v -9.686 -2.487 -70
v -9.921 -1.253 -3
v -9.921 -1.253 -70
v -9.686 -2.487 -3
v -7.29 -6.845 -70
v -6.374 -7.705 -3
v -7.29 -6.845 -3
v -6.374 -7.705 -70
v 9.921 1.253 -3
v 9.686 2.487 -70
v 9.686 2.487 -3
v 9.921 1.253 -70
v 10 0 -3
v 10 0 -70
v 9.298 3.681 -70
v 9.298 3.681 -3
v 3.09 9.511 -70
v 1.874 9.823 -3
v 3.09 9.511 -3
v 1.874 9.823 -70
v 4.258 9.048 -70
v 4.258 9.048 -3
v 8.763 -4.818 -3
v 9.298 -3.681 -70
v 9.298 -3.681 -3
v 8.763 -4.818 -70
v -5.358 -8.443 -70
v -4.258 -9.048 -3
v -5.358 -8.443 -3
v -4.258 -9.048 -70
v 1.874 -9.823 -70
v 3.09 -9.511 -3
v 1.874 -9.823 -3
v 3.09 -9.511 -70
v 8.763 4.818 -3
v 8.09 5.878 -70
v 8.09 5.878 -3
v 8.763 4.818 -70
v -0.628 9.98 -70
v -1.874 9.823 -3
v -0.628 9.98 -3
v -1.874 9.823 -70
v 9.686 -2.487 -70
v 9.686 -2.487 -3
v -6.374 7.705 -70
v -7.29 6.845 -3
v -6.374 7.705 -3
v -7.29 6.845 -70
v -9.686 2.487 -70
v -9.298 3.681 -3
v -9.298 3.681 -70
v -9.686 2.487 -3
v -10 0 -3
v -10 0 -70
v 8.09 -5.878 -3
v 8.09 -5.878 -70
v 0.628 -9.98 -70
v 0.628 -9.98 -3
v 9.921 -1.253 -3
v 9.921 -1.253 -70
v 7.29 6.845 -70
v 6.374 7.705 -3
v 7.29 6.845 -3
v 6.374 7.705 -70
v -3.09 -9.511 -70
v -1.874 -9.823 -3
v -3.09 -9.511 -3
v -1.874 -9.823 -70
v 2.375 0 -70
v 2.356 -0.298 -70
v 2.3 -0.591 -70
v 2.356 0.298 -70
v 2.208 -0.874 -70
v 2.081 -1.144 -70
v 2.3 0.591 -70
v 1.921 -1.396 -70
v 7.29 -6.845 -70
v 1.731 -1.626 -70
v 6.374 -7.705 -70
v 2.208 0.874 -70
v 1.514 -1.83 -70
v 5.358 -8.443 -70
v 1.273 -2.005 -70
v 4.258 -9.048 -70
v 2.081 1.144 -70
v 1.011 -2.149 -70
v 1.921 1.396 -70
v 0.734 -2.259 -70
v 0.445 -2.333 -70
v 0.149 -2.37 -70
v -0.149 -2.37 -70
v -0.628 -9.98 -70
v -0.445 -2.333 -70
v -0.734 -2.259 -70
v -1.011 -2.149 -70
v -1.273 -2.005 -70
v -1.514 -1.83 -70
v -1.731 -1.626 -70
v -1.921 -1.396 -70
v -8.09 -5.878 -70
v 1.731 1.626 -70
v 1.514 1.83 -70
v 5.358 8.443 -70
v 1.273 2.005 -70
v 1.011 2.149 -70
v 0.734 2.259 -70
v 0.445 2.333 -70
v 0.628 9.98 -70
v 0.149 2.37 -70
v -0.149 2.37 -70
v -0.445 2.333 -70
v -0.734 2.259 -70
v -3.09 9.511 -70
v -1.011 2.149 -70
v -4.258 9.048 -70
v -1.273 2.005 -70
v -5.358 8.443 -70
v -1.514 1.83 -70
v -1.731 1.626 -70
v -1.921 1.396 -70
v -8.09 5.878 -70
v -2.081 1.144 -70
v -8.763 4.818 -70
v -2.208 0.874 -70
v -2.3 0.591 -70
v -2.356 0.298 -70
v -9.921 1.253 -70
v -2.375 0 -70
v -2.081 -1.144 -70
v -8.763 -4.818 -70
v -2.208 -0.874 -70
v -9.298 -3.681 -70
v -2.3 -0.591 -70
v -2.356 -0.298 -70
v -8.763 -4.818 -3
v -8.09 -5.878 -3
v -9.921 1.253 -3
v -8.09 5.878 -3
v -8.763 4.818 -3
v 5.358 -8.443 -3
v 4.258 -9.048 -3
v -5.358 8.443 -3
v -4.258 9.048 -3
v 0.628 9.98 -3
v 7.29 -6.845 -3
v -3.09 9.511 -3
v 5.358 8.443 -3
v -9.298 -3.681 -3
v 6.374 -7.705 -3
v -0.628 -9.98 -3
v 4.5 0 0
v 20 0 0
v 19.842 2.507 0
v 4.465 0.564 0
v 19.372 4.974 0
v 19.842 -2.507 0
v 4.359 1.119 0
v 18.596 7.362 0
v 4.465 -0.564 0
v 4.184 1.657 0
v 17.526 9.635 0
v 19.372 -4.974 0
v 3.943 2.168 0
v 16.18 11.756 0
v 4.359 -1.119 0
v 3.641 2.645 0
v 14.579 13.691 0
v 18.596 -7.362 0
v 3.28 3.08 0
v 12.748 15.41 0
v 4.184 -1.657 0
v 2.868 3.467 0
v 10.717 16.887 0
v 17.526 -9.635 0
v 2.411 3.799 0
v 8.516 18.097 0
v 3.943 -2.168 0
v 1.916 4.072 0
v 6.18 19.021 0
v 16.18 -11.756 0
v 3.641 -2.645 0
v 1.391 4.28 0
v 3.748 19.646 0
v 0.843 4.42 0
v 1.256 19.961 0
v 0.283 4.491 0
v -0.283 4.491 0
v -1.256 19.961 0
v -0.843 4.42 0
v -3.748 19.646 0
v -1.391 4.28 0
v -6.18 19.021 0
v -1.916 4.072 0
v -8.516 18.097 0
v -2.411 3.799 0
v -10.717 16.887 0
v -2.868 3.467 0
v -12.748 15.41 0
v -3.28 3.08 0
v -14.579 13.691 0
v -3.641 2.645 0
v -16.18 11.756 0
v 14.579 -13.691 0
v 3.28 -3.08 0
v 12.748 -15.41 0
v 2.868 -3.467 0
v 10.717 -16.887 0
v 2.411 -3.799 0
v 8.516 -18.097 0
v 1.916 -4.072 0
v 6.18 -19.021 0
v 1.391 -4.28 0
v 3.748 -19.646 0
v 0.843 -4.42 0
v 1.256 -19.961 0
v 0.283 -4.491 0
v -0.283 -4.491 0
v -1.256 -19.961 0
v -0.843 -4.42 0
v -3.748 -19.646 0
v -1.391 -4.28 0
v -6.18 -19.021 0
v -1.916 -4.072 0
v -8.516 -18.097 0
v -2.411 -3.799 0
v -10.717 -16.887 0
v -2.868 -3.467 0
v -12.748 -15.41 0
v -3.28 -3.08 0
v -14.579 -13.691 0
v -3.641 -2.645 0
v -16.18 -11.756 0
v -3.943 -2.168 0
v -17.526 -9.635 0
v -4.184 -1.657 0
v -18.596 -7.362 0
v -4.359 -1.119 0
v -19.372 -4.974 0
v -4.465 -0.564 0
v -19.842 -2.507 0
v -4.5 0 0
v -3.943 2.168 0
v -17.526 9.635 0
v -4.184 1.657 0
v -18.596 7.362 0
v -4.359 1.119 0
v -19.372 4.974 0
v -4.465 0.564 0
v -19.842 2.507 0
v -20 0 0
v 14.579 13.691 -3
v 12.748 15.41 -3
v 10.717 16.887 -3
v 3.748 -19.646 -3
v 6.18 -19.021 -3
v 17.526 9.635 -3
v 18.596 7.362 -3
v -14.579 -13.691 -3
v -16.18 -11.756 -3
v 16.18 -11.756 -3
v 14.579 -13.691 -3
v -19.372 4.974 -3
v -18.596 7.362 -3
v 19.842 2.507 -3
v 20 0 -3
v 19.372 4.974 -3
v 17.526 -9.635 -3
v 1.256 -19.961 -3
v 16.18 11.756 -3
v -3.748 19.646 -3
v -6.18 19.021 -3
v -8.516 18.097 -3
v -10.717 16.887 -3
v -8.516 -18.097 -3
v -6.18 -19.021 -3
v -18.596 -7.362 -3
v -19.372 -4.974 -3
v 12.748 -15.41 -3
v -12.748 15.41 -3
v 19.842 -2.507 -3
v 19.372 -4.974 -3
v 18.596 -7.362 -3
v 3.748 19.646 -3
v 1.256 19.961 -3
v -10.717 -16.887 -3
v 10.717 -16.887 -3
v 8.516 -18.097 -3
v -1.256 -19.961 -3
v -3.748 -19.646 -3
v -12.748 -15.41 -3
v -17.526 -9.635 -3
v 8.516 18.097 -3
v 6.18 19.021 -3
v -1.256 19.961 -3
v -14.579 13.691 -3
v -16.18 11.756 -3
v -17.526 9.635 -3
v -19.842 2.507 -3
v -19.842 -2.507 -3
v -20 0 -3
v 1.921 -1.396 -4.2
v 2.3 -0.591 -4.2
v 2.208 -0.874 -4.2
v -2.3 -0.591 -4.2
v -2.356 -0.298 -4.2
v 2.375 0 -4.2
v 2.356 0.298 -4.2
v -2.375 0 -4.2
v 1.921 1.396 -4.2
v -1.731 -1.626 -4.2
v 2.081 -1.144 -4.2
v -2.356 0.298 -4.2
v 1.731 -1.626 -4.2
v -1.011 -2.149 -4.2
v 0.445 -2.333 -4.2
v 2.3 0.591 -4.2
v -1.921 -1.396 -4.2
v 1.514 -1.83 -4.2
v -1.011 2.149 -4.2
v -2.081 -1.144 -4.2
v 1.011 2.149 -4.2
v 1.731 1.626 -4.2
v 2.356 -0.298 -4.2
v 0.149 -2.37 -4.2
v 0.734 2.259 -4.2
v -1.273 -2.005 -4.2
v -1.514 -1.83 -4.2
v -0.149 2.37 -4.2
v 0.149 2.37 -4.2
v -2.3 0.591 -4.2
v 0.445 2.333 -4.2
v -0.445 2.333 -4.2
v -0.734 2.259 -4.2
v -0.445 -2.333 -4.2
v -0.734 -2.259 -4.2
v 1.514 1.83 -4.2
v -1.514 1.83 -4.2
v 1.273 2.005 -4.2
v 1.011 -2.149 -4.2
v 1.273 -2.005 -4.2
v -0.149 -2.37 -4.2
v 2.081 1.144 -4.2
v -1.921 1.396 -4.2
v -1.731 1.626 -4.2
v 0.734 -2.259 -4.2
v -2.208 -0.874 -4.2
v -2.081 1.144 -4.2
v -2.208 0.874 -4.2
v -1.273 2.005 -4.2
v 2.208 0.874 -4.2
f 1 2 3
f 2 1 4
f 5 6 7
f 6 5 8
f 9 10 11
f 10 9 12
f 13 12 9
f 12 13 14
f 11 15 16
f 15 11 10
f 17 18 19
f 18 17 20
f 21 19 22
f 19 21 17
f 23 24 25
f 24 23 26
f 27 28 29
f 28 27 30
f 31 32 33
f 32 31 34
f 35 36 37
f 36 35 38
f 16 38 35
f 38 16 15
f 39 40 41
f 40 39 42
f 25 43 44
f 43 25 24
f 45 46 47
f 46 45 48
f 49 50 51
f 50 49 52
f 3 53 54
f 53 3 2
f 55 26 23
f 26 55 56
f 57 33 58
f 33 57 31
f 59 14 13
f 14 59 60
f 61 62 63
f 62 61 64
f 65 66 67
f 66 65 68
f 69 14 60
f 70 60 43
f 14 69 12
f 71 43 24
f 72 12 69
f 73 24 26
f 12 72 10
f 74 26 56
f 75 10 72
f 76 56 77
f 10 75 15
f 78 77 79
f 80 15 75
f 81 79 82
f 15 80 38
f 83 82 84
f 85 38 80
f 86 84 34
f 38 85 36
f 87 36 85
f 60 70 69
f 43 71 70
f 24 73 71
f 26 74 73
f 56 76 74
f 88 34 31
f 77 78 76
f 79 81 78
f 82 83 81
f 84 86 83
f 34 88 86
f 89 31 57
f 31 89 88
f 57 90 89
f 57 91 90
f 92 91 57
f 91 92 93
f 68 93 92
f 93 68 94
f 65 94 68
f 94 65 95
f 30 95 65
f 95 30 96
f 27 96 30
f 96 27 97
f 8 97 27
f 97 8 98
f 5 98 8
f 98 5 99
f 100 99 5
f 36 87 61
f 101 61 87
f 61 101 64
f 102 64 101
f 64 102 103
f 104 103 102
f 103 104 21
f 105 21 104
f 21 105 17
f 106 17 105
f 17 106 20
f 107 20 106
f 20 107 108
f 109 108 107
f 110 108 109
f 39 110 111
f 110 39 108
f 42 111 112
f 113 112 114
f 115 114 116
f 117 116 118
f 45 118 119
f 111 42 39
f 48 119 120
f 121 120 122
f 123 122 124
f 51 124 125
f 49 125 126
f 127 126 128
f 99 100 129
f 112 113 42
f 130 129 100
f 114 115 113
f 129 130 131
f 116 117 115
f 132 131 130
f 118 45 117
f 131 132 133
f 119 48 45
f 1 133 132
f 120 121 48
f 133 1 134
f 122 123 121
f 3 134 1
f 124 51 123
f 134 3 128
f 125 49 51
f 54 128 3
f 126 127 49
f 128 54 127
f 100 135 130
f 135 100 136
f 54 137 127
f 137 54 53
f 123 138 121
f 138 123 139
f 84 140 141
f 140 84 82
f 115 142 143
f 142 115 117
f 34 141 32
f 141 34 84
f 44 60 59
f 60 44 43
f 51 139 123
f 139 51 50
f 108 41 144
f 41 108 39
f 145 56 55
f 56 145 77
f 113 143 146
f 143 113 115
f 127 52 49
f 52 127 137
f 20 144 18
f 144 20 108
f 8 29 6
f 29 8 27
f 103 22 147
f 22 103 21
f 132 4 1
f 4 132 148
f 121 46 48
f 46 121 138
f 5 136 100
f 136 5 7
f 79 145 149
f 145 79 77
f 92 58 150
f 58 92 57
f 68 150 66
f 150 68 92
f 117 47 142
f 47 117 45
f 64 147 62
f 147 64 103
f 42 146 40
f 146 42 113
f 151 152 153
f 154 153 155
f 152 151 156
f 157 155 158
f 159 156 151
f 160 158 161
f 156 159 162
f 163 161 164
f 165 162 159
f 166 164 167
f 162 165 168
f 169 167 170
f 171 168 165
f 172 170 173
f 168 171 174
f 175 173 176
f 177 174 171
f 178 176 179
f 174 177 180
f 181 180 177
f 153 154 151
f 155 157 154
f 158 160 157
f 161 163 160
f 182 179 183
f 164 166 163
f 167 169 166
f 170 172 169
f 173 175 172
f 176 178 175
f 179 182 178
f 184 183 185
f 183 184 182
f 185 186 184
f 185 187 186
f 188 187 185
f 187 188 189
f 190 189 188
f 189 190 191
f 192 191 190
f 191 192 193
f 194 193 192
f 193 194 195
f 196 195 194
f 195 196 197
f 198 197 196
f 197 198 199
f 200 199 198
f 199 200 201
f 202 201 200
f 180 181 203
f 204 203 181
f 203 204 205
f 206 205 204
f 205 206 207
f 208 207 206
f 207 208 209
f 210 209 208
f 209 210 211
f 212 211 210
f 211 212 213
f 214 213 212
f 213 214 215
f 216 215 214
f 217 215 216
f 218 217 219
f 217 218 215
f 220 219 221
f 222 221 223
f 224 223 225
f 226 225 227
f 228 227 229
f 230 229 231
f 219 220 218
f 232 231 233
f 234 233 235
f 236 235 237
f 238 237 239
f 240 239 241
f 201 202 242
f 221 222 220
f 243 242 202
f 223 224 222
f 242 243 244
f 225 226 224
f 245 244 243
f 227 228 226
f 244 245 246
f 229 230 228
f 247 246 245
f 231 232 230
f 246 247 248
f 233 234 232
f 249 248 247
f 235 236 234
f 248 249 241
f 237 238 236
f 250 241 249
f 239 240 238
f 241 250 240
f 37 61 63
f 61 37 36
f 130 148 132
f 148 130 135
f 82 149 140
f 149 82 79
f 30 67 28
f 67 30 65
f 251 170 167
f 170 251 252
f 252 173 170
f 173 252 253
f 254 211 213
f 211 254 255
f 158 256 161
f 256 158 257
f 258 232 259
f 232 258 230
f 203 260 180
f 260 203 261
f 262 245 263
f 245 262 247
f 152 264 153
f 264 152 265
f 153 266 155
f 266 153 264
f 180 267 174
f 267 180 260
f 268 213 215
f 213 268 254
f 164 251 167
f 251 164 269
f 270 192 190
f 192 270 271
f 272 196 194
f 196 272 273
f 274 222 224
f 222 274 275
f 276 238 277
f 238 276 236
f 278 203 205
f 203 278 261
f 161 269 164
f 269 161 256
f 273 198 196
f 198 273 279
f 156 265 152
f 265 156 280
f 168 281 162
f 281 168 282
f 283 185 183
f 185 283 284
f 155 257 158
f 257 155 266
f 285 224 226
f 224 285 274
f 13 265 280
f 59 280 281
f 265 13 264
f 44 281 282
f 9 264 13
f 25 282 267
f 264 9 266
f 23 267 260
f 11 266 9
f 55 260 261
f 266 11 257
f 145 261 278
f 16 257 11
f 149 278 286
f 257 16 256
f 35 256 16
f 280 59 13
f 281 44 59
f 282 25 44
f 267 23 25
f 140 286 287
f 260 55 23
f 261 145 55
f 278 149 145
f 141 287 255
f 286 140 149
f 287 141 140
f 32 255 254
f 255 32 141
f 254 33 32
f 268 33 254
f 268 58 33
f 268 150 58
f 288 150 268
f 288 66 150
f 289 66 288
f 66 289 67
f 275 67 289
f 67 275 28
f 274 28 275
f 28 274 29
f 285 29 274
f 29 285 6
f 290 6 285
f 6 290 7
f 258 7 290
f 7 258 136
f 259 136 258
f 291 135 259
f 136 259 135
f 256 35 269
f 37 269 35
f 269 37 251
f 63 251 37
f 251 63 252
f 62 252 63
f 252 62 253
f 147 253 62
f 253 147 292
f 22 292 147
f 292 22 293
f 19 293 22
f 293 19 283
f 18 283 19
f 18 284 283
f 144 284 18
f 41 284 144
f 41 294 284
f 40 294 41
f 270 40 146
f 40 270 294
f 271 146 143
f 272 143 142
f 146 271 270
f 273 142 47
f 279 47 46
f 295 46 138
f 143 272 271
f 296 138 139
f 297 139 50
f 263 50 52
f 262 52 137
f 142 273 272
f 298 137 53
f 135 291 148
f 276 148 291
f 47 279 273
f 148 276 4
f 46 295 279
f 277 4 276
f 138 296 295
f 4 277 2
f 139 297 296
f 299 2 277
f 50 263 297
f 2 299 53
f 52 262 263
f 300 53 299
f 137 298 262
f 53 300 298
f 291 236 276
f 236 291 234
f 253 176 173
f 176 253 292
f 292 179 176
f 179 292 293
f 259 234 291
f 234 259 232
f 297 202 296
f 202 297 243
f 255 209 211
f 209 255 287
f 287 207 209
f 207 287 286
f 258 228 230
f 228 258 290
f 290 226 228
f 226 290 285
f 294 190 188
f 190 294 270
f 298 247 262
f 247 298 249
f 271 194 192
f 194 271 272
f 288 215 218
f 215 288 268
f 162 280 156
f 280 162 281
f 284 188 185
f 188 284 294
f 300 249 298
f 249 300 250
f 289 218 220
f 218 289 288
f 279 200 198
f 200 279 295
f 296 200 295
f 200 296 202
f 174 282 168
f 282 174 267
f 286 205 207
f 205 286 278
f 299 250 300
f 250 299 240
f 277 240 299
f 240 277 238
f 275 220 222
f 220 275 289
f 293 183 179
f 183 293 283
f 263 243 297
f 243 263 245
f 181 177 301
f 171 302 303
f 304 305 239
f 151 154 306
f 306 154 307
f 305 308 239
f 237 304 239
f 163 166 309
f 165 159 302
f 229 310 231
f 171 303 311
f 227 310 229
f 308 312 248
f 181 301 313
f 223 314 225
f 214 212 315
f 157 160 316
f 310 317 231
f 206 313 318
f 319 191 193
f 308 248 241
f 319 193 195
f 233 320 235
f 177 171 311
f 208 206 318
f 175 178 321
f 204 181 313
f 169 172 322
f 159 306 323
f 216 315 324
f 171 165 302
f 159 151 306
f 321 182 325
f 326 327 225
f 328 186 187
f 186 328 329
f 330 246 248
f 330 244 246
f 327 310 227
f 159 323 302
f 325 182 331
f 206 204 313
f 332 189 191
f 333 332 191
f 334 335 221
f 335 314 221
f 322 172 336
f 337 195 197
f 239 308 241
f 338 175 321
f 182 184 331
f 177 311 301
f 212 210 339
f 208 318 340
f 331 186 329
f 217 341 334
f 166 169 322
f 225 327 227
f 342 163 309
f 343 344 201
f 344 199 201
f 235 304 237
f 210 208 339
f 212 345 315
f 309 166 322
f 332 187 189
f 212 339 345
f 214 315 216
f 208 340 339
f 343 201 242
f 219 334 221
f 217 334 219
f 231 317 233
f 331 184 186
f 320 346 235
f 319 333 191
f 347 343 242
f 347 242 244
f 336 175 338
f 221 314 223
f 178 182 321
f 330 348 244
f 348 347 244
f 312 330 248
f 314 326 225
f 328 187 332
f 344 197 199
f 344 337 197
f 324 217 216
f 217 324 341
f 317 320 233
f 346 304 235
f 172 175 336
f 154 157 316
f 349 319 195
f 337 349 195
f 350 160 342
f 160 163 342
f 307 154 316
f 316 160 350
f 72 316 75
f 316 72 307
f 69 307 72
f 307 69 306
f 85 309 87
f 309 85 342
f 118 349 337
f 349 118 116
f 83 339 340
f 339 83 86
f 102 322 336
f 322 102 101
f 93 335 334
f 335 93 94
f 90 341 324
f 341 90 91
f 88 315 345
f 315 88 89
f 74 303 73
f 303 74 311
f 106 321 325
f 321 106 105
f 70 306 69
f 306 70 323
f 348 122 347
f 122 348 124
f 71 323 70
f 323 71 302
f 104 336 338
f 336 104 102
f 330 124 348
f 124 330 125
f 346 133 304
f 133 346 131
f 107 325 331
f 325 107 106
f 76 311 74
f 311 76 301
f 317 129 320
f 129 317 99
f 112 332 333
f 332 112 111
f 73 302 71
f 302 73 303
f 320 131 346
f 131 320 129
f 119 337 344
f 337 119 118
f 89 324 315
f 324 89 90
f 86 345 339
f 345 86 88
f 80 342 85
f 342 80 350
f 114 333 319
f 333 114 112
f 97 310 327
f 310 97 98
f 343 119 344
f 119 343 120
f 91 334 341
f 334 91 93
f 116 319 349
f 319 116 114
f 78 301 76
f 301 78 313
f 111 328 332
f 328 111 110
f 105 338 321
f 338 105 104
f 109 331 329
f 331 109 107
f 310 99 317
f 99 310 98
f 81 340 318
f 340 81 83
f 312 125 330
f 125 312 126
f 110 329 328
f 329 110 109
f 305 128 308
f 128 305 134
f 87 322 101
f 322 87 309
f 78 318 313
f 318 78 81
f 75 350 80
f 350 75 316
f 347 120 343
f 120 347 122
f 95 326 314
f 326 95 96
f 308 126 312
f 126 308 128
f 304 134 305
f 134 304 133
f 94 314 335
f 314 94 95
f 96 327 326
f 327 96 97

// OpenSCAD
$fn = 50;


difference() {
	union() {
		translate(v = [0, 0, -70.0000000000]) {
			cylinder(h = 70, r = 10.0000000000);
		}
		translate(v = [0, 0, -3.0000000000]) {
			cylinder(h = 3, r = 20.0000000000);
		}
	}
	union() {
		translate(v = [0, 0, 0]) {
			rotate(a = [0, 0, 0]) {
				difference() {
					union() {
						#translate(v = [0, 0, -70.0000000000]) {
							cylinder(h = 70, r = 2.2500000000);
						}
						#translate(v = [0, 0, -4.2000000000]) {
							cylinder(h = 4.2000000000, r1 = 2.3750000000, r2 = 4.5000000000);
						}
						#translate(v = [0, 0, -70.0000000000]) {
							cylinder(h = 70, r = 2.3750000000);
						}
						#translate(v = [0, 0, -70.0000000000]) {
							cylinder(h = 70, r = 2.2500000000);
						}
					}
					union();
				}
			}
		}
	}
}
